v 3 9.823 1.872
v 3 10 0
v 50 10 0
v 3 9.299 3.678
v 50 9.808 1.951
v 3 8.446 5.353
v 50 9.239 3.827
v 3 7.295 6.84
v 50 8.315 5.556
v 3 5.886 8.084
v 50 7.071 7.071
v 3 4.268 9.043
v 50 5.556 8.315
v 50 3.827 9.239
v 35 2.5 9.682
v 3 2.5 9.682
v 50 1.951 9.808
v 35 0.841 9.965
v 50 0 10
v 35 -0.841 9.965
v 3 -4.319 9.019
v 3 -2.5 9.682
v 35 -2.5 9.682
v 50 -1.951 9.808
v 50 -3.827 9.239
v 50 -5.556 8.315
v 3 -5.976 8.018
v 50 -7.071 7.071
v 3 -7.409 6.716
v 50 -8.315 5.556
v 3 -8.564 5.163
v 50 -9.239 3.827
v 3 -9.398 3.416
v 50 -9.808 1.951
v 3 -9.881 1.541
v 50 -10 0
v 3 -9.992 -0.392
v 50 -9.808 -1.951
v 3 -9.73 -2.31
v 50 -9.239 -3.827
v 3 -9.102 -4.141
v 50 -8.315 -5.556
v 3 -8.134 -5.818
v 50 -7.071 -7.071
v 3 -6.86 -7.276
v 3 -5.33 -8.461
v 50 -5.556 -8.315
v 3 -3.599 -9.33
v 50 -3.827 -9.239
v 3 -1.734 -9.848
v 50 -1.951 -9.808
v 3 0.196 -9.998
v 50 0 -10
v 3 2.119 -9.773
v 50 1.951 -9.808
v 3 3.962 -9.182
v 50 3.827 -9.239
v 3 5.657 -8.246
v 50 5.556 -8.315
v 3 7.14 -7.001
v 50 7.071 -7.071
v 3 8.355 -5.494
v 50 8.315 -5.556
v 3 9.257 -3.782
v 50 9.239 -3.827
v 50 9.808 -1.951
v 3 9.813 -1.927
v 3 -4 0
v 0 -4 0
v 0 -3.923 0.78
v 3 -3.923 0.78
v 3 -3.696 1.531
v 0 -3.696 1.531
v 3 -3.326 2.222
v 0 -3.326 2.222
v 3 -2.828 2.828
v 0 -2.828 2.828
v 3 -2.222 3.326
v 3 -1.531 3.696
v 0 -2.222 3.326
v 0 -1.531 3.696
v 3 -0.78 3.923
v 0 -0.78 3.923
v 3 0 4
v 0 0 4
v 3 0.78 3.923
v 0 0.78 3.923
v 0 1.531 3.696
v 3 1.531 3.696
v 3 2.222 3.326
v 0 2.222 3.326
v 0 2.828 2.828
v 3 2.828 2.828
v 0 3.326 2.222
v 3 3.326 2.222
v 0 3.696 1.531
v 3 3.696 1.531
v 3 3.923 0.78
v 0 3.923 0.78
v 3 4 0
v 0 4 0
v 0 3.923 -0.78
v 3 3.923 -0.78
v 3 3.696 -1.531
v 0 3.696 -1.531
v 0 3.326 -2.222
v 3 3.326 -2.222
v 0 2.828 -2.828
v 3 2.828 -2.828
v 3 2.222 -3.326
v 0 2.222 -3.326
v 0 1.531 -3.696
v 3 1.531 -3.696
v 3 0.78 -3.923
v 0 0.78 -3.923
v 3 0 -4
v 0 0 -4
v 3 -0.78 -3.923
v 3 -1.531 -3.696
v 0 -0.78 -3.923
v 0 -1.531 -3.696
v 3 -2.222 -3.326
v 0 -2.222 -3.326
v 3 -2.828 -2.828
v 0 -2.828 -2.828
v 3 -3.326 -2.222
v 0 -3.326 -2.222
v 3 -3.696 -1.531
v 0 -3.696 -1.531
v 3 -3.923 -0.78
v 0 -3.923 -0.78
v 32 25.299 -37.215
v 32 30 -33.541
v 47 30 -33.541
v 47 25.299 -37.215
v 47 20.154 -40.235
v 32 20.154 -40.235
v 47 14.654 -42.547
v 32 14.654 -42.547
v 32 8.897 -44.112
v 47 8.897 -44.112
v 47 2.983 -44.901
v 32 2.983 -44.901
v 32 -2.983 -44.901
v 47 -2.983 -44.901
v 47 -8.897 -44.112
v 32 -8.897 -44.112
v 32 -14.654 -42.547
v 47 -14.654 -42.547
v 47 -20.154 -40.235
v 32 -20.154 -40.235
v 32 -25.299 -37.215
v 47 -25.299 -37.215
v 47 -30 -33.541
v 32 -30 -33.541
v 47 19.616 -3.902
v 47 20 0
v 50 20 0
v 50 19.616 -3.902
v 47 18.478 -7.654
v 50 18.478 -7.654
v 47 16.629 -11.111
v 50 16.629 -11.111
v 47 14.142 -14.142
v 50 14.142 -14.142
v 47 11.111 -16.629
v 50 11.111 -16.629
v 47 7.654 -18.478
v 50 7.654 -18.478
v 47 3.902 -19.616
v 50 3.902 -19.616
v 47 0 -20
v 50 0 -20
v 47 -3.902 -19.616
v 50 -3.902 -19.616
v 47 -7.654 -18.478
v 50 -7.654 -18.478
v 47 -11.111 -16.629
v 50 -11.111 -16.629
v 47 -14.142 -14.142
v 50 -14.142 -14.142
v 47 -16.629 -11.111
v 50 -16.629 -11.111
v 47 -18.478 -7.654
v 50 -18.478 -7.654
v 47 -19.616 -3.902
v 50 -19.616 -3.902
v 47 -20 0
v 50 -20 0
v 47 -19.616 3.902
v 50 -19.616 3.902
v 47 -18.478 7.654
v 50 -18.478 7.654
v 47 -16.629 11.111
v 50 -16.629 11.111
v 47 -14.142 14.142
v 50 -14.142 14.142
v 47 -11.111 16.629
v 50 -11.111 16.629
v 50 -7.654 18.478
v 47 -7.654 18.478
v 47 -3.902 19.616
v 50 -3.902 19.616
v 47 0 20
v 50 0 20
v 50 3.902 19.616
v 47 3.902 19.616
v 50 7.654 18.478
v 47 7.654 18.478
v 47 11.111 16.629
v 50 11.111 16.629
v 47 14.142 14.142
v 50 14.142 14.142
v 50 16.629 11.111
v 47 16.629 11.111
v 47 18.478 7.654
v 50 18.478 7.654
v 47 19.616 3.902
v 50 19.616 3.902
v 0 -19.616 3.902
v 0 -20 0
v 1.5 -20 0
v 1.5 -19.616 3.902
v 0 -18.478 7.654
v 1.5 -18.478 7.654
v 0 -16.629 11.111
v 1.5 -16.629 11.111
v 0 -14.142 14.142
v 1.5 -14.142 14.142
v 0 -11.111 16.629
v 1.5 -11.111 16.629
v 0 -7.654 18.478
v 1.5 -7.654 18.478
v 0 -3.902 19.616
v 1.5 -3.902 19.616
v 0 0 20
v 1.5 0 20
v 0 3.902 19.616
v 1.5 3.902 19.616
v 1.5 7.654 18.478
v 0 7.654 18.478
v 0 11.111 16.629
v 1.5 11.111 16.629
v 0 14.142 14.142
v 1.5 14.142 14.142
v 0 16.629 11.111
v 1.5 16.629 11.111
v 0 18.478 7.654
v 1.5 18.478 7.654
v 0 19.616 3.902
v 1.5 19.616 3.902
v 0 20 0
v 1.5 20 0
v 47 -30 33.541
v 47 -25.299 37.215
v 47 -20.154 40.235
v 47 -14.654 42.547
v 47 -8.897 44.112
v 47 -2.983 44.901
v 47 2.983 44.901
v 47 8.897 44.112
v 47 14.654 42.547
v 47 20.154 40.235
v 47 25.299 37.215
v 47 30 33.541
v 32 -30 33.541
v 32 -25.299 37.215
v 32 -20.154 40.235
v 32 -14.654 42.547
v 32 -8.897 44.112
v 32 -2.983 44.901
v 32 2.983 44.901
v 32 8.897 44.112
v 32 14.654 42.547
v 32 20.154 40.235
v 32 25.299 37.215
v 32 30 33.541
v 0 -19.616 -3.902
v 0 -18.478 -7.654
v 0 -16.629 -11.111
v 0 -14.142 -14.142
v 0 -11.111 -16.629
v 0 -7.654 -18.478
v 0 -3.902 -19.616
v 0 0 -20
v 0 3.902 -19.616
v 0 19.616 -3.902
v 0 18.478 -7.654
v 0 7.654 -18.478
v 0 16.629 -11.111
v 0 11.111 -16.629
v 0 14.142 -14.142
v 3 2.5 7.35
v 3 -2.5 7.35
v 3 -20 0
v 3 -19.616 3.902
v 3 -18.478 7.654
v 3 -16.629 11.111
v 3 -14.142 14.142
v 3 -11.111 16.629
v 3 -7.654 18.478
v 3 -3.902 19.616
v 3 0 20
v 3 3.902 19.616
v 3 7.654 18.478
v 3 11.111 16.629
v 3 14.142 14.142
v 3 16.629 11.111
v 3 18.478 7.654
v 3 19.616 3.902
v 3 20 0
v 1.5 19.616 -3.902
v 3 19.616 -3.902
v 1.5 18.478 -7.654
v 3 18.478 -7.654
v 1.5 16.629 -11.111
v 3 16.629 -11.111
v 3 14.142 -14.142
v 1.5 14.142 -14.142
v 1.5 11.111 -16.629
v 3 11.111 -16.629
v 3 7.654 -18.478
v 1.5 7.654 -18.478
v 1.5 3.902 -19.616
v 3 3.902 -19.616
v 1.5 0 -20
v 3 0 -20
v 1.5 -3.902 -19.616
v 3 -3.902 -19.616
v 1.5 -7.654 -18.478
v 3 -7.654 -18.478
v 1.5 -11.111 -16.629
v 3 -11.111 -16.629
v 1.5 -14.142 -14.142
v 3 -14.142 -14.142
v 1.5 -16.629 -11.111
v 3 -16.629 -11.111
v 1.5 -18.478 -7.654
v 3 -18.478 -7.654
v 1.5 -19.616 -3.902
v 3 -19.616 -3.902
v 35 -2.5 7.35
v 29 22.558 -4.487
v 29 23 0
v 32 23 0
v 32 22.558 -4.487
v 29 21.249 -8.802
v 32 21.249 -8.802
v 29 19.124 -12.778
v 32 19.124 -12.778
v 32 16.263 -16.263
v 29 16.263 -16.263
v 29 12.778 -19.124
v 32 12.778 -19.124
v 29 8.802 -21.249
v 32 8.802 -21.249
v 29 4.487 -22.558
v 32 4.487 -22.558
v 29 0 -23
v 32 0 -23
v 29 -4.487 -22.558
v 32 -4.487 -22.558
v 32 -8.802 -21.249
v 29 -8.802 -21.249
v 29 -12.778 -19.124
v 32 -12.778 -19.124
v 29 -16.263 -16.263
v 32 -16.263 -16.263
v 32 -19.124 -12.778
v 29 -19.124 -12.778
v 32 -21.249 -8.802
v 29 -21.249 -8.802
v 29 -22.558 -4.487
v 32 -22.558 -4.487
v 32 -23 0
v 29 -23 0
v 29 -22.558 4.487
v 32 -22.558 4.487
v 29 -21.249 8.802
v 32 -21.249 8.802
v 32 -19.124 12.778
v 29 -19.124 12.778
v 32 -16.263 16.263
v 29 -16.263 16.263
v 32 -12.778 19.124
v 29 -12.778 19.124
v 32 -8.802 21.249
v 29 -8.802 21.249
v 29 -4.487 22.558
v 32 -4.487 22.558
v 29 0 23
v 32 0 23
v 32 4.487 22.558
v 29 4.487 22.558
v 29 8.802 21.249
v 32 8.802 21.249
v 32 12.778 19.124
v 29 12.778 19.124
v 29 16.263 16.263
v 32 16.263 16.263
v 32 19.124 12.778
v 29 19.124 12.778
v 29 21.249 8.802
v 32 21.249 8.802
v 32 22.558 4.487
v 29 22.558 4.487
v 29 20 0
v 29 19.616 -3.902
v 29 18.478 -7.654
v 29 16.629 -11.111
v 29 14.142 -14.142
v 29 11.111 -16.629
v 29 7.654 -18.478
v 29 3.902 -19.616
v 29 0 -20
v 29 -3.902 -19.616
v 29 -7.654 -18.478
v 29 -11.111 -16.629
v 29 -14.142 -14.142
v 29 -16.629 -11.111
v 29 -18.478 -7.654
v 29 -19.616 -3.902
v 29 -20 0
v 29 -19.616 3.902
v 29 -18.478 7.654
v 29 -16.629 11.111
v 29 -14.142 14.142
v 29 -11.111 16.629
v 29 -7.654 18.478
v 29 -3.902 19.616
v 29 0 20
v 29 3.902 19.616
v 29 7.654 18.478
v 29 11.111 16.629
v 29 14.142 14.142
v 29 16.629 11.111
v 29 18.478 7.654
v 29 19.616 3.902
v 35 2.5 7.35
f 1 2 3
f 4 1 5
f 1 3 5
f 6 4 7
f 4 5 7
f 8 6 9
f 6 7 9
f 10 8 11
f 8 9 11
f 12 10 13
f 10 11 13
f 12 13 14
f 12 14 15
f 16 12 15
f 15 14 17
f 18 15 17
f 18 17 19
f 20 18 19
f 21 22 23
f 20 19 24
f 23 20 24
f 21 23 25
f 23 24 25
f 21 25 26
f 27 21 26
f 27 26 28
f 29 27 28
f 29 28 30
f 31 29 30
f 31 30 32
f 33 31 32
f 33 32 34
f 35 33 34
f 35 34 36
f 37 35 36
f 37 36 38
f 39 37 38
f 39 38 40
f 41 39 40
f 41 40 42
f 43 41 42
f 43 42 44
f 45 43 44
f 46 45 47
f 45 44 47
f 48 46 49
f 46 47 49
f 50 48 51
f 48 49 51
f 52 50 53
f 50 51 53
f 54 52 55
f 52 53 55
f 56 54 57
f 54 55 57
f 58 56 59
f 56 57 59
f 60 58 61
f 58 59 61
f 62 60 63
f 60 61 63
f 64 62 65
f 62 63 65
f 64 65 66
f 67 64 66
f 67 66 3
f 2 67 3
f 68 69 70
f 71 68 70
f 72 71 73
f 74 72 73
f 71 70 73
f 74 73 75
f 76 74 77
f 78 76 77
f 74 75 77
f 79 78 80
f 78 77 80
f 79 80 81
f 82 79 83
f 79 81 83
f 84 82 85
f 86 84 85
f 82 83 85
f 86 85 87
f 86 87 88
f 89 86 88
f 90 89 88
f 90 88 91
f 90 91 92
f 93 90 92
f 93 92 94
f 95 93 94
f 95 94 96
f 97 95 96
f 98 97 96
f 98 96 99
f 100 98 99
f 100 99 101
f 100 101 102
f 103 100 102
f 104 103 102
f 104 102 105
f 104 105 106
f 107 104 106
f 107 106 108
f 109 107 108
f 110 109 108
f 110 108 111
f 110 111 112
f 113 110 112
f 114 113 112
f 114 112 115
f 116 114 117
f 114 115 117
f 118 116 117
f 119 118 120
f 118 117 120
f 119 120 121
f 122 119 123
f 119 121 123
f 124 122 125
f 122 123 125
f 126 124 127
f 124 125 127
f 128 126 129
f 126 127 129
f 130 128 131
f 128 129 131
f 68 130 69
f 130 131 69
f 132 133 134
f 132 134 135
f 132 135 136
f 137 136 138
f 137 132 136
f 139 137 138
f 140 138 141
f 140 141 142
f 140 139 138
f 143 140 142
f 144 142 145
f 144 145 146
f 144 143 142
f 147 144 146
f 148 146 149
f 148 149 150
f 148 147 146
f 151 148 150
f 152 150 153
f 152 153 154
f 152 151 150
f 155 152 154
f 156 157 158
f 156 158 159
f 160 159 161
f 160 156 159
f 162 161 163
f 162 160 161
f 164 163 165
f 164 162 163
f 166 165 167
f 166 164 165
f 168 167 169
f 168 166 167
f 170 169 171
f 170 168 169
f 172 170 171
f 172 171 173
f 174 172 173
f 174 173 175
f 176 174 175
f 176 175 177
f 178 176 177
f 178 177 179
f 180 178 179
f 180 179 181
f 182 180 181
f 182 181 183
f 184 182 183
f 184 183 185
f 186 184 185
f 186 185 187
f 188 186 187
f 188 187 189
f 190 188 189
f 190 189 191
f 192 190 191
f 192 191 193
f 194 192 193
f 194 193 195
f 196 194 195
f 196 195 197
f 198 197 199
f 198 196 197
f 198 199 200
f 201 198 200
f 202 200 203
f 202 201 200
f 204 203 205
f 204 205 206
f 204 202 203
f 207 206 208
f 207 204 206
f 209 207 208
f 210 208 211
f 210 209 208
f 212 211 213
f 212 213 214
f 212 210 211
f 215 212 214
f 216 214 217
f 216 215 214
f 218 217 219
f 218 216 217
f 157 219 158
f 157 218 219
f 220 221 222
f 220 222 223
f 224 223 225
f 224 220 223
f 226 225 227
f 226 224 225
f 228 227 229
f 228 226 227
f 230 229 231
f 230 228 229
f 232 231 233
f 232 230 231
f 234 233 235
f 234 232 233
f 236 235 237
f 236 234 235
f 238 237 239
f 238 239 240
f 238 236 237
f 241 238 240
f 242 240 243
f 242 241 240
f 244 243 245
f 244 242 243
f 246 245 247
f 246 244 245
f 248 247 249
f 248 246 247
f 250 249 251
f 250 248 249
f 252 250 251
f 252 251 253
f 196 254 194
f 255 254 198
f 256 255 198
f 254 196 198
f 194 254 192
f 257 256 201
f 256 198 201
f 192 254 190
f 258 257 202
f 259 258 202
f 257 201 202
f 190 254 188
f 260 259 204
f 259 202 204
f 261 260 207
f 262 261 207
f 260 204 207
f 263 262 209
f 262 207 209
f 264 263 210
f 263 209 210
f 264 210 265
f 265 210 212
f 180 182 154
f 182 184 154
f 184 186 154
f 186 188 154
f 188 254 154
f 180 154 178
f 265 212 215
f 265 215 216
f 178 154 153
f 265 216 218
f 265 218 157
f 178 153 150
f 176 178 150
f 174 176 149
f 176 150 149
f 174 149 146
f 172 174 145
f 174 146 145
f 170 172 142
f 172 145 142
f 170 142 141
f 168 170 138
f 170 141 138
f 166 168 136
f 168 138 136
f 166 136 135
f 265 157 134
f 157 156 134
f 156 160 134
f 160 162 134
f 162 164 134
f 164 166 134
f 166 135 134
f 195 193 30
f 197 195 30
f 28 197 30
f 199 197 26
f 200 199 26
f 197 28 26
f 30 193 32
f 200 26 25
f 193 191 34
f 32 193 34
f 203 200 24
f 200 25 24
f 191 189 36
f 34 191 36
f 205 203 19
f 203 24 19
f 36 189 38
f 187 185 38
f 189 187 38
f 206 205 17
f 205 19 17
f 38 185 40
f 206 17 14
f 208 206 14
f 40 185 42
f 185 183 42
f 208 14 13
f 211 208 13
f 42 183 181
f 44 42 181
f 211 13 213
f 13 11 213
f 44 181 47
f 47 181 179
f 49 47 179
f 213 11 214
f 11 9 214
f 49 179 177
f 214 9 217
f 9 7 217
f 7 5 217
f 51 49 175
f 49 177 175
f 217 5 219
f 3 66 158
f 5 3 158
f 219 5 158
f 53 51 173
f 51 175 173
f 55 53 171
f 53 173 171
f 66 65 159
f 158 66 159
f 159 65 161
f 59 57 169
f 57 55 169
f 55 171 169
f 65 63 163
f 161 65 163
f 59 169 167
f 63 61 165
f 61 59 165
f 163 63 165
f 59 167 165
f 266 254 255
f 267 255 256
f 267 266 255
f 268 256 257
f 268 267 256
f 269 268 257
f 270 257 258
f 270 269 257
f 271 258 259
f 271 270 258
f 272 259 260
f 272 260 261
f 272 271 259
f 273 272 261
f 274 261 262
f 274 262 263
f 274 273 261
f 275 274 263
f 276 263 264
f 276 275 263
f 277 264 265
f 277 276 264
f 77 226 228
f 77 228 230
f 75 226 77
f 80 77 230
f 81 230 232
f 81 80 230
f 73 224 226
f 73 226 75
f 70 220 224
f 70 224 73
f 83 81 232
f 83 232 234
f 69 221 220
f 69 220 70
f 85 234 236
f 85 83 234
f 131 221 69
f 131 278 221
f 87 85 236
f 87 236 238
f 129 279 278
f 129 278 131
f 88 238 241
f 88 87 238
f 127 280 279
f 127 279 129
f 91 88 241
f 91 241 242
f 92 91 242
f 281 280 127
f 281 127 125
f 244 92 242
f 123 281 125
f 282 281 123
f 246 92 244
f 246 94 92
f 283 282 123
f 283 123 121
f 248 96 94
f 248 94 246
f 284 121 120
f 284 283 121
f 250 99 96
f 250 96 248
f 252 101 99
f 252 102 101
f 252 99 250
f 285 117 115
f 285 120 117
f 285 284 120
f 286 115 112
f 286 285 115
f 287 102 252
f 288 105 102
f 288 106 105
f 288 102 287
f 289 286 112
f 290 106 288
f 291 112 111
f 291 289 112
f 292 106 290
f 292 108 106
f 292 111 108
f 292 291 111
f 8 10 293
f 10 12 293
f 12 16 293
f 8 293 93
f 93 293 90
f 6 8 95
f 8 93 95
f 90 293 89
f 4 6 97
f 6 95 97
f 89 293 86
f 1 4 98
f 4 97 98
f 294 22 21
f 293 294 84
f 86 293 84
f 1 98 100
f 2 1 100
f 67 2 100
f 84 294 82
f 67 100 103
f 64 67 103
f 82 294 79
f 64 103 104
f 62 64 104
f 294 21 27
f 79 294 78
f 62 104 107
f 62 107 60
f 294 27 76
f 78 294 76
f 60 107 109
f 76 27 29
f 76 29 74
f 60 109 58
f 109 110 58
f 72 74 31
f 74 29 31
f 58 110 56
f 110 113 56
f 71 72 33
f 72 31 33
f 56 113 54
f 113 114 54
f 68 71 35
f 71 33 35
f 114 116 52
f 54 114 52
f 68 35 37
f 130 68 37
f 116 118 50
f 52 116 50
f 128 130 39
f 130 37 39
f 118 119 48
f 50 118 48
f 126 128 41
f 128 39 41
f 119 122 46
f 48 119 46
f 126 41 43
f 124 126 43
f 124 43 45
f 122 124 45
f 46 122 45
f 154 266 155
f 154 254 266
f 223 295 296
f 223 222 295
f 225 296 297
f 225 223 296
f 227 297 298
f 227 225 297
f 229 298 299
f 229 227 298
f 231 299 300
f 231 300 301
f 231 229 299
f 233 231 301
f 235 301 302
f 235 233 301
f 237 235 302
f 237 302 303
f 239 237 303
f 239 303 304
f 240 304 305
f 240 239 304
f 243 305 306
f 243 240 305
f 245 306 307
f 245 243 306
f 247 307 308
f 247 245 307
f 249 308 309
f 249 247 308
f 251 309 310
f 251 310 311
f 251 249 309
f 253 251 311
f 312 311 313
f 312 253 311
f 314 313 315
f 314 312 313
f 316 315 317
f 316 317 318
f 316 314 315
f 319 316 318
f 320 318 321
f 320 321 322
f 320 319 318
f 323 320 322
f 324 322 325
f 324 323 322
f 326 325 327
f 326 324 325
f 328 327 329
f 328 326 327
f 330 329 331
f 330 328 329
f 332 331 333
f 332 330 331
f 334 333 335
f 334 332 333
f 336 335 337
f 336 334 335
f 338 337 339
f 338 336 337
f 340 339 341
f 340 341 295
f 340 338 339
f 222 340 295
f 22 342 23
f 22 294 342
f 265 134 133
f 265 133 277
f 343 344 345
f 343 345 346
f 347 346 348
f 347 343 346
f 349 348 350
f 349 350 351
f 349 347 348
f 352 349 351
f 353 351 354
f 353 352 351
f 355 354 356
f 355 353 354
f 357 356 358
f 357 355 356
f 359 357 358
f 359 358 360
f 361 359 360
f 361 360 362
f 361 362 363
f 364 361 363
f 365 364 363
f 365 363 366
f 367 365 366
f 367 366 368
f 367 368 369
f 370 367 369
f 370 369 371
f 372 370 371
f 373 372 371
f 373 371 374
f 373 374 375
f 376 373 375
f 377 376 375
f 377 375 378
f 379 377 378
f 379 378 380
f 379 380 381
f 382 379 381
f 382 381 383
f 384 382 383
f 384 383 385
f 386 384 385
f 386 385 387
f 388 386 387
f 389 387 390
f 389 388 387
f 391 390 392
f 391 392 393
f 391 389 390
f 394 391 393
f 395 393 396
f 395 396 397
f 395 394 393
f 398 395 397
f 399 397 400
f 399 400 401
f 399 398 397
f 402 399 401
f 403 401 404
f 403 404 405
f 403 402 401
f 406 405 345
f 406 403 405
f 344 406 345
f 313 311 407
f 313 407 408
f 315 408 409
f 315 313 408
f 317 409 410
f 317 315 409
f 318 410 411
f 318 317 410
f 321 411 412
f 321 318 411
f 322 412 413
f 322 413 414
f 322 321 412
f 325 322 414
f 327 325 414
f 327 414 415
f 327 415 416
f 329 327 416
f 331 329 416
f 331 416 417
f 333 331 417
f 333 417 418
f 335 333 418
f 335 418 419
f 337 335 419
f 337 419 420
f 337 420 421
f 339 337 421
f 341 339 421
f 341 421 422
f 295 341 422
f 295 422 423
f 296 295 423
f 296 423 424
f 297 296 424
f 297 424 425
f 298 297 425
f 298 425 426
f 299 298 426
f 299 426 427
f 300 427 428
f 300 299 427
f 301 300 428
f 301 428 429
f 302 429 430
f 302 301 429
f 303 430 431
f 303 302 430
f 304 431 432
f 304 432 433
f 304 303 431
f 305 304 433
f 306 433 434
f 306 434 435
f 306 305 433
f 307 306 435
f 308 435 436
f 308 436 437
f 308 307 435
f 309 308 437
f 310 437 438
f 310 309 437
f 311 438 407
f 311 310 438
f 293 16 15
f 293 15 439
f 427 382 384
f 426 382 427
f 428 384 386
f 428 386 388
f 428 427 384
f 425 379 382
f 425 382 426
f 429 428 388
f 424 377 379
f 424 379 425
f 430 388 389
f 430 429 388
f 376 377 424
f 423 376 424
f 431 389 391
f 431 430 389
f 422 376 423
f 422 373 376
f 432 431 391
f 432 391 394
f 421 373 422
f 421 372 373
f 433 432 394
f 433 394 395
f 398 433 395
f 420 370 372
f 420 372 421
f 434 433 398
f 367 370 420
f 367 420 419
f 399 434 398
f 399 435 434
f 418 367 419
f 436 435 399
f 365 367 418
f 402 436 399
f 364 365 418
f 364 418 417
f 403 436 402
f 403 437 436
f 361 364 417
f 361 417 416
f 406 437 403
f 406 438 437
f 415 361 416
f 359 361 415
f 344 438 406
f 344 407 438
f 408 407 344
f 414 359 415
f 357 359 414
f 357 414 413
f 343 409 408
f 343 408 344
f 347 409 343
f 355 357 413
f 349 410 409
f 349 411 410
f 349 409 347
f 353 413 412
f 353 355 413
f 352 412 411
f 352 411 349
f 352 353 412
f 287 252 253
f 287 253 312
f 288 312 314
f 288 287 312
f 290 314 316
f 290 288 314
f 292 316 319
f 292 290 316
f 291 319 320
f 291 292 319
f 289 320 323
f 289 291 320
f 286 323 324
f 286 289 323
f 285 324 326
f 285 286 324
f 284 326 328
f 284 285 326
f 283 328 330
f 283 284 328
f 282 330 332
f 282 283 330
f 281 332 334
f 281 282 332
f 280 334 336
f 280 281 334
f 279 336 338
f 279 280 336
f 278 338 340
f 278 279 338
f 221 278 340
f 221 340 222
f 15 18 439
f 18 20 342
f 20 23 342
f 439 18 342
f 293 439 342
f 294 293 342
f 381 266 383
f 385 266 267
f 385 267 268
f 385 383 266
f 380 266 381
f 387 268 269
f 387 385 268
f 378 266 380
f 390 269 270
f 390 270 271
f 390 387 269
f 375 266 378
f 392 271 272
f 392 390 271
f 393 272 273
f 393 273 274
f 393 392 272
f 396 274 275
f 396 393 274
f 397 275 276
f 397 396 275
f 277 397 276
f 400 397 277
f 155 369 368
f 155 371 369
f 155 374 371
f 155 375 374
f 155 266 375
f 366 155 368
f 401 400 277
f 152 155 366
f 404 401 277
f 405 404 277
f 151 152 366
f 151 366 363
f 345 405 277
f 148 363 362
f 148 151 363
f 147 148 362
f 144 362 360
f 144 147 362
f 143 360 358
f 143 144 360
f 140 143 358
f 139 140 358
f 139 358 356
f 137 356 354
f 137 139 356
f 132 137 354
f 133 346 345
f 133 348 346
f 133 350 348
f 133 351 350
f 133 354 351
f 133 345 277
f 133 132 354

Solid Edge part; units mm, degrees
sketch "Sketch1" plane through (0, 0, 0) normal (0, 0, 1) x (1, 0, 0)
  line L0 (0, 10) -> (50, 10)
  line L1 (50, 10) -> (50, 20)
  line L2 (50, 20) -> (47, 20)
  line L3 (47, 20) -> (47, 45)
  line L4 (47, 45) -> (32, 45)
  line L5 (32, 45) -> (32, 23)
  line L6 (32, 23) -> (29, 23)
  line L7 (29, 23) -> (29, 20)
  line L8 (29, 20) -> (3, 20)
  line L9 (3, 20) -> (3, 18)
  line L10 (3, 18) -> (1.5, 18)
  line L11 (1.5, 18) -> (1.5, 20)
  line L12 (1.5, 20) -> (0, 20)
  line L13 (0, 20) -> (0, 10)
  dimension "D1" = 50
  dimension "D2" = 10
  dimension "D3" = 25
  dimension "D4" = 15
  dimension "D5" = 22
  dimension "D6" = 26
  dimension "D7" = 1.5
  dimension "D8" = 10
  dimension "D9" = 3
  dimension "D10" = 3
  dimension "D11" = 1.5
  dimension "D12" = 2
  dimension "D13" = 10
revolve "RevolvedProtrusion1" add sketch "Sketch1" angle 360 about axis through (57, 0, 0) along (-1, 0, 0)
sketch "Sketch2" plane through (47, 0, 0) normal (1, 0, 0) x (0, 1, 0)
  line L0 (179.2581, -202.8725) -> (30, -202.8725)
  line L1 (30, -202.8725) -> (30, 202.8725)
  line L2 (30, 202.8725) -> (179.2581, 202.8725)
  line L3 (179.2581, 202.8725) -> (179.2581, -202.8725)
  line L4 (-30, -200.4946) -> (-139.3849, -200.4946)
  line L5 (-139.3849, -200.4946) -> (-139.3849, 200.4946)
  line L6 (-139.3849, 200.4946) -> (-30, 200.4946)
  line L7 (-30, 200.4946) -> (-30, -200.4946)
extrude "Cutout1" cut sketch "Sketch2" against normal blind 2932.3571
sketch "Sketch3" plane through (0, 0, 0) normal (-1, 0, 0) x (0, -1, 0)
  line L0 (-2.5, 7.35) -> (2.5, 7.35)
  line L1 (2.5, 7.35) -> (2.5, 12.65)
  line L2 (2.5, 12.65) -> (-2.5, 12.65)
  line L3 (-2.5, 12.65) -> (-2.5, 7.35)
extrude "ExtrudedProtrusion_2" add sketch "Sketch3" against normal blind 35
sketch "Sketch4" plane through (0, 0, 0) normal (-1, 0, 0) x (0, -1, 0)
  circle A0 centre (0, 0) radius 20
extrude "ExtrudedProtrusion_3" add sketch "Sketch4" against normal blind 3
sketch "Sketch5" plane through (0, 0, 0) normal (-1, 0, 0) x (0, -1, 0)
  circle A0 centre (0, 0) radius 4
extrude "ExtrudedCutout_2" cut sketch "Sketch5" along normal mid plane 90.6479
properties material "Aluminum, 6061-T6"
